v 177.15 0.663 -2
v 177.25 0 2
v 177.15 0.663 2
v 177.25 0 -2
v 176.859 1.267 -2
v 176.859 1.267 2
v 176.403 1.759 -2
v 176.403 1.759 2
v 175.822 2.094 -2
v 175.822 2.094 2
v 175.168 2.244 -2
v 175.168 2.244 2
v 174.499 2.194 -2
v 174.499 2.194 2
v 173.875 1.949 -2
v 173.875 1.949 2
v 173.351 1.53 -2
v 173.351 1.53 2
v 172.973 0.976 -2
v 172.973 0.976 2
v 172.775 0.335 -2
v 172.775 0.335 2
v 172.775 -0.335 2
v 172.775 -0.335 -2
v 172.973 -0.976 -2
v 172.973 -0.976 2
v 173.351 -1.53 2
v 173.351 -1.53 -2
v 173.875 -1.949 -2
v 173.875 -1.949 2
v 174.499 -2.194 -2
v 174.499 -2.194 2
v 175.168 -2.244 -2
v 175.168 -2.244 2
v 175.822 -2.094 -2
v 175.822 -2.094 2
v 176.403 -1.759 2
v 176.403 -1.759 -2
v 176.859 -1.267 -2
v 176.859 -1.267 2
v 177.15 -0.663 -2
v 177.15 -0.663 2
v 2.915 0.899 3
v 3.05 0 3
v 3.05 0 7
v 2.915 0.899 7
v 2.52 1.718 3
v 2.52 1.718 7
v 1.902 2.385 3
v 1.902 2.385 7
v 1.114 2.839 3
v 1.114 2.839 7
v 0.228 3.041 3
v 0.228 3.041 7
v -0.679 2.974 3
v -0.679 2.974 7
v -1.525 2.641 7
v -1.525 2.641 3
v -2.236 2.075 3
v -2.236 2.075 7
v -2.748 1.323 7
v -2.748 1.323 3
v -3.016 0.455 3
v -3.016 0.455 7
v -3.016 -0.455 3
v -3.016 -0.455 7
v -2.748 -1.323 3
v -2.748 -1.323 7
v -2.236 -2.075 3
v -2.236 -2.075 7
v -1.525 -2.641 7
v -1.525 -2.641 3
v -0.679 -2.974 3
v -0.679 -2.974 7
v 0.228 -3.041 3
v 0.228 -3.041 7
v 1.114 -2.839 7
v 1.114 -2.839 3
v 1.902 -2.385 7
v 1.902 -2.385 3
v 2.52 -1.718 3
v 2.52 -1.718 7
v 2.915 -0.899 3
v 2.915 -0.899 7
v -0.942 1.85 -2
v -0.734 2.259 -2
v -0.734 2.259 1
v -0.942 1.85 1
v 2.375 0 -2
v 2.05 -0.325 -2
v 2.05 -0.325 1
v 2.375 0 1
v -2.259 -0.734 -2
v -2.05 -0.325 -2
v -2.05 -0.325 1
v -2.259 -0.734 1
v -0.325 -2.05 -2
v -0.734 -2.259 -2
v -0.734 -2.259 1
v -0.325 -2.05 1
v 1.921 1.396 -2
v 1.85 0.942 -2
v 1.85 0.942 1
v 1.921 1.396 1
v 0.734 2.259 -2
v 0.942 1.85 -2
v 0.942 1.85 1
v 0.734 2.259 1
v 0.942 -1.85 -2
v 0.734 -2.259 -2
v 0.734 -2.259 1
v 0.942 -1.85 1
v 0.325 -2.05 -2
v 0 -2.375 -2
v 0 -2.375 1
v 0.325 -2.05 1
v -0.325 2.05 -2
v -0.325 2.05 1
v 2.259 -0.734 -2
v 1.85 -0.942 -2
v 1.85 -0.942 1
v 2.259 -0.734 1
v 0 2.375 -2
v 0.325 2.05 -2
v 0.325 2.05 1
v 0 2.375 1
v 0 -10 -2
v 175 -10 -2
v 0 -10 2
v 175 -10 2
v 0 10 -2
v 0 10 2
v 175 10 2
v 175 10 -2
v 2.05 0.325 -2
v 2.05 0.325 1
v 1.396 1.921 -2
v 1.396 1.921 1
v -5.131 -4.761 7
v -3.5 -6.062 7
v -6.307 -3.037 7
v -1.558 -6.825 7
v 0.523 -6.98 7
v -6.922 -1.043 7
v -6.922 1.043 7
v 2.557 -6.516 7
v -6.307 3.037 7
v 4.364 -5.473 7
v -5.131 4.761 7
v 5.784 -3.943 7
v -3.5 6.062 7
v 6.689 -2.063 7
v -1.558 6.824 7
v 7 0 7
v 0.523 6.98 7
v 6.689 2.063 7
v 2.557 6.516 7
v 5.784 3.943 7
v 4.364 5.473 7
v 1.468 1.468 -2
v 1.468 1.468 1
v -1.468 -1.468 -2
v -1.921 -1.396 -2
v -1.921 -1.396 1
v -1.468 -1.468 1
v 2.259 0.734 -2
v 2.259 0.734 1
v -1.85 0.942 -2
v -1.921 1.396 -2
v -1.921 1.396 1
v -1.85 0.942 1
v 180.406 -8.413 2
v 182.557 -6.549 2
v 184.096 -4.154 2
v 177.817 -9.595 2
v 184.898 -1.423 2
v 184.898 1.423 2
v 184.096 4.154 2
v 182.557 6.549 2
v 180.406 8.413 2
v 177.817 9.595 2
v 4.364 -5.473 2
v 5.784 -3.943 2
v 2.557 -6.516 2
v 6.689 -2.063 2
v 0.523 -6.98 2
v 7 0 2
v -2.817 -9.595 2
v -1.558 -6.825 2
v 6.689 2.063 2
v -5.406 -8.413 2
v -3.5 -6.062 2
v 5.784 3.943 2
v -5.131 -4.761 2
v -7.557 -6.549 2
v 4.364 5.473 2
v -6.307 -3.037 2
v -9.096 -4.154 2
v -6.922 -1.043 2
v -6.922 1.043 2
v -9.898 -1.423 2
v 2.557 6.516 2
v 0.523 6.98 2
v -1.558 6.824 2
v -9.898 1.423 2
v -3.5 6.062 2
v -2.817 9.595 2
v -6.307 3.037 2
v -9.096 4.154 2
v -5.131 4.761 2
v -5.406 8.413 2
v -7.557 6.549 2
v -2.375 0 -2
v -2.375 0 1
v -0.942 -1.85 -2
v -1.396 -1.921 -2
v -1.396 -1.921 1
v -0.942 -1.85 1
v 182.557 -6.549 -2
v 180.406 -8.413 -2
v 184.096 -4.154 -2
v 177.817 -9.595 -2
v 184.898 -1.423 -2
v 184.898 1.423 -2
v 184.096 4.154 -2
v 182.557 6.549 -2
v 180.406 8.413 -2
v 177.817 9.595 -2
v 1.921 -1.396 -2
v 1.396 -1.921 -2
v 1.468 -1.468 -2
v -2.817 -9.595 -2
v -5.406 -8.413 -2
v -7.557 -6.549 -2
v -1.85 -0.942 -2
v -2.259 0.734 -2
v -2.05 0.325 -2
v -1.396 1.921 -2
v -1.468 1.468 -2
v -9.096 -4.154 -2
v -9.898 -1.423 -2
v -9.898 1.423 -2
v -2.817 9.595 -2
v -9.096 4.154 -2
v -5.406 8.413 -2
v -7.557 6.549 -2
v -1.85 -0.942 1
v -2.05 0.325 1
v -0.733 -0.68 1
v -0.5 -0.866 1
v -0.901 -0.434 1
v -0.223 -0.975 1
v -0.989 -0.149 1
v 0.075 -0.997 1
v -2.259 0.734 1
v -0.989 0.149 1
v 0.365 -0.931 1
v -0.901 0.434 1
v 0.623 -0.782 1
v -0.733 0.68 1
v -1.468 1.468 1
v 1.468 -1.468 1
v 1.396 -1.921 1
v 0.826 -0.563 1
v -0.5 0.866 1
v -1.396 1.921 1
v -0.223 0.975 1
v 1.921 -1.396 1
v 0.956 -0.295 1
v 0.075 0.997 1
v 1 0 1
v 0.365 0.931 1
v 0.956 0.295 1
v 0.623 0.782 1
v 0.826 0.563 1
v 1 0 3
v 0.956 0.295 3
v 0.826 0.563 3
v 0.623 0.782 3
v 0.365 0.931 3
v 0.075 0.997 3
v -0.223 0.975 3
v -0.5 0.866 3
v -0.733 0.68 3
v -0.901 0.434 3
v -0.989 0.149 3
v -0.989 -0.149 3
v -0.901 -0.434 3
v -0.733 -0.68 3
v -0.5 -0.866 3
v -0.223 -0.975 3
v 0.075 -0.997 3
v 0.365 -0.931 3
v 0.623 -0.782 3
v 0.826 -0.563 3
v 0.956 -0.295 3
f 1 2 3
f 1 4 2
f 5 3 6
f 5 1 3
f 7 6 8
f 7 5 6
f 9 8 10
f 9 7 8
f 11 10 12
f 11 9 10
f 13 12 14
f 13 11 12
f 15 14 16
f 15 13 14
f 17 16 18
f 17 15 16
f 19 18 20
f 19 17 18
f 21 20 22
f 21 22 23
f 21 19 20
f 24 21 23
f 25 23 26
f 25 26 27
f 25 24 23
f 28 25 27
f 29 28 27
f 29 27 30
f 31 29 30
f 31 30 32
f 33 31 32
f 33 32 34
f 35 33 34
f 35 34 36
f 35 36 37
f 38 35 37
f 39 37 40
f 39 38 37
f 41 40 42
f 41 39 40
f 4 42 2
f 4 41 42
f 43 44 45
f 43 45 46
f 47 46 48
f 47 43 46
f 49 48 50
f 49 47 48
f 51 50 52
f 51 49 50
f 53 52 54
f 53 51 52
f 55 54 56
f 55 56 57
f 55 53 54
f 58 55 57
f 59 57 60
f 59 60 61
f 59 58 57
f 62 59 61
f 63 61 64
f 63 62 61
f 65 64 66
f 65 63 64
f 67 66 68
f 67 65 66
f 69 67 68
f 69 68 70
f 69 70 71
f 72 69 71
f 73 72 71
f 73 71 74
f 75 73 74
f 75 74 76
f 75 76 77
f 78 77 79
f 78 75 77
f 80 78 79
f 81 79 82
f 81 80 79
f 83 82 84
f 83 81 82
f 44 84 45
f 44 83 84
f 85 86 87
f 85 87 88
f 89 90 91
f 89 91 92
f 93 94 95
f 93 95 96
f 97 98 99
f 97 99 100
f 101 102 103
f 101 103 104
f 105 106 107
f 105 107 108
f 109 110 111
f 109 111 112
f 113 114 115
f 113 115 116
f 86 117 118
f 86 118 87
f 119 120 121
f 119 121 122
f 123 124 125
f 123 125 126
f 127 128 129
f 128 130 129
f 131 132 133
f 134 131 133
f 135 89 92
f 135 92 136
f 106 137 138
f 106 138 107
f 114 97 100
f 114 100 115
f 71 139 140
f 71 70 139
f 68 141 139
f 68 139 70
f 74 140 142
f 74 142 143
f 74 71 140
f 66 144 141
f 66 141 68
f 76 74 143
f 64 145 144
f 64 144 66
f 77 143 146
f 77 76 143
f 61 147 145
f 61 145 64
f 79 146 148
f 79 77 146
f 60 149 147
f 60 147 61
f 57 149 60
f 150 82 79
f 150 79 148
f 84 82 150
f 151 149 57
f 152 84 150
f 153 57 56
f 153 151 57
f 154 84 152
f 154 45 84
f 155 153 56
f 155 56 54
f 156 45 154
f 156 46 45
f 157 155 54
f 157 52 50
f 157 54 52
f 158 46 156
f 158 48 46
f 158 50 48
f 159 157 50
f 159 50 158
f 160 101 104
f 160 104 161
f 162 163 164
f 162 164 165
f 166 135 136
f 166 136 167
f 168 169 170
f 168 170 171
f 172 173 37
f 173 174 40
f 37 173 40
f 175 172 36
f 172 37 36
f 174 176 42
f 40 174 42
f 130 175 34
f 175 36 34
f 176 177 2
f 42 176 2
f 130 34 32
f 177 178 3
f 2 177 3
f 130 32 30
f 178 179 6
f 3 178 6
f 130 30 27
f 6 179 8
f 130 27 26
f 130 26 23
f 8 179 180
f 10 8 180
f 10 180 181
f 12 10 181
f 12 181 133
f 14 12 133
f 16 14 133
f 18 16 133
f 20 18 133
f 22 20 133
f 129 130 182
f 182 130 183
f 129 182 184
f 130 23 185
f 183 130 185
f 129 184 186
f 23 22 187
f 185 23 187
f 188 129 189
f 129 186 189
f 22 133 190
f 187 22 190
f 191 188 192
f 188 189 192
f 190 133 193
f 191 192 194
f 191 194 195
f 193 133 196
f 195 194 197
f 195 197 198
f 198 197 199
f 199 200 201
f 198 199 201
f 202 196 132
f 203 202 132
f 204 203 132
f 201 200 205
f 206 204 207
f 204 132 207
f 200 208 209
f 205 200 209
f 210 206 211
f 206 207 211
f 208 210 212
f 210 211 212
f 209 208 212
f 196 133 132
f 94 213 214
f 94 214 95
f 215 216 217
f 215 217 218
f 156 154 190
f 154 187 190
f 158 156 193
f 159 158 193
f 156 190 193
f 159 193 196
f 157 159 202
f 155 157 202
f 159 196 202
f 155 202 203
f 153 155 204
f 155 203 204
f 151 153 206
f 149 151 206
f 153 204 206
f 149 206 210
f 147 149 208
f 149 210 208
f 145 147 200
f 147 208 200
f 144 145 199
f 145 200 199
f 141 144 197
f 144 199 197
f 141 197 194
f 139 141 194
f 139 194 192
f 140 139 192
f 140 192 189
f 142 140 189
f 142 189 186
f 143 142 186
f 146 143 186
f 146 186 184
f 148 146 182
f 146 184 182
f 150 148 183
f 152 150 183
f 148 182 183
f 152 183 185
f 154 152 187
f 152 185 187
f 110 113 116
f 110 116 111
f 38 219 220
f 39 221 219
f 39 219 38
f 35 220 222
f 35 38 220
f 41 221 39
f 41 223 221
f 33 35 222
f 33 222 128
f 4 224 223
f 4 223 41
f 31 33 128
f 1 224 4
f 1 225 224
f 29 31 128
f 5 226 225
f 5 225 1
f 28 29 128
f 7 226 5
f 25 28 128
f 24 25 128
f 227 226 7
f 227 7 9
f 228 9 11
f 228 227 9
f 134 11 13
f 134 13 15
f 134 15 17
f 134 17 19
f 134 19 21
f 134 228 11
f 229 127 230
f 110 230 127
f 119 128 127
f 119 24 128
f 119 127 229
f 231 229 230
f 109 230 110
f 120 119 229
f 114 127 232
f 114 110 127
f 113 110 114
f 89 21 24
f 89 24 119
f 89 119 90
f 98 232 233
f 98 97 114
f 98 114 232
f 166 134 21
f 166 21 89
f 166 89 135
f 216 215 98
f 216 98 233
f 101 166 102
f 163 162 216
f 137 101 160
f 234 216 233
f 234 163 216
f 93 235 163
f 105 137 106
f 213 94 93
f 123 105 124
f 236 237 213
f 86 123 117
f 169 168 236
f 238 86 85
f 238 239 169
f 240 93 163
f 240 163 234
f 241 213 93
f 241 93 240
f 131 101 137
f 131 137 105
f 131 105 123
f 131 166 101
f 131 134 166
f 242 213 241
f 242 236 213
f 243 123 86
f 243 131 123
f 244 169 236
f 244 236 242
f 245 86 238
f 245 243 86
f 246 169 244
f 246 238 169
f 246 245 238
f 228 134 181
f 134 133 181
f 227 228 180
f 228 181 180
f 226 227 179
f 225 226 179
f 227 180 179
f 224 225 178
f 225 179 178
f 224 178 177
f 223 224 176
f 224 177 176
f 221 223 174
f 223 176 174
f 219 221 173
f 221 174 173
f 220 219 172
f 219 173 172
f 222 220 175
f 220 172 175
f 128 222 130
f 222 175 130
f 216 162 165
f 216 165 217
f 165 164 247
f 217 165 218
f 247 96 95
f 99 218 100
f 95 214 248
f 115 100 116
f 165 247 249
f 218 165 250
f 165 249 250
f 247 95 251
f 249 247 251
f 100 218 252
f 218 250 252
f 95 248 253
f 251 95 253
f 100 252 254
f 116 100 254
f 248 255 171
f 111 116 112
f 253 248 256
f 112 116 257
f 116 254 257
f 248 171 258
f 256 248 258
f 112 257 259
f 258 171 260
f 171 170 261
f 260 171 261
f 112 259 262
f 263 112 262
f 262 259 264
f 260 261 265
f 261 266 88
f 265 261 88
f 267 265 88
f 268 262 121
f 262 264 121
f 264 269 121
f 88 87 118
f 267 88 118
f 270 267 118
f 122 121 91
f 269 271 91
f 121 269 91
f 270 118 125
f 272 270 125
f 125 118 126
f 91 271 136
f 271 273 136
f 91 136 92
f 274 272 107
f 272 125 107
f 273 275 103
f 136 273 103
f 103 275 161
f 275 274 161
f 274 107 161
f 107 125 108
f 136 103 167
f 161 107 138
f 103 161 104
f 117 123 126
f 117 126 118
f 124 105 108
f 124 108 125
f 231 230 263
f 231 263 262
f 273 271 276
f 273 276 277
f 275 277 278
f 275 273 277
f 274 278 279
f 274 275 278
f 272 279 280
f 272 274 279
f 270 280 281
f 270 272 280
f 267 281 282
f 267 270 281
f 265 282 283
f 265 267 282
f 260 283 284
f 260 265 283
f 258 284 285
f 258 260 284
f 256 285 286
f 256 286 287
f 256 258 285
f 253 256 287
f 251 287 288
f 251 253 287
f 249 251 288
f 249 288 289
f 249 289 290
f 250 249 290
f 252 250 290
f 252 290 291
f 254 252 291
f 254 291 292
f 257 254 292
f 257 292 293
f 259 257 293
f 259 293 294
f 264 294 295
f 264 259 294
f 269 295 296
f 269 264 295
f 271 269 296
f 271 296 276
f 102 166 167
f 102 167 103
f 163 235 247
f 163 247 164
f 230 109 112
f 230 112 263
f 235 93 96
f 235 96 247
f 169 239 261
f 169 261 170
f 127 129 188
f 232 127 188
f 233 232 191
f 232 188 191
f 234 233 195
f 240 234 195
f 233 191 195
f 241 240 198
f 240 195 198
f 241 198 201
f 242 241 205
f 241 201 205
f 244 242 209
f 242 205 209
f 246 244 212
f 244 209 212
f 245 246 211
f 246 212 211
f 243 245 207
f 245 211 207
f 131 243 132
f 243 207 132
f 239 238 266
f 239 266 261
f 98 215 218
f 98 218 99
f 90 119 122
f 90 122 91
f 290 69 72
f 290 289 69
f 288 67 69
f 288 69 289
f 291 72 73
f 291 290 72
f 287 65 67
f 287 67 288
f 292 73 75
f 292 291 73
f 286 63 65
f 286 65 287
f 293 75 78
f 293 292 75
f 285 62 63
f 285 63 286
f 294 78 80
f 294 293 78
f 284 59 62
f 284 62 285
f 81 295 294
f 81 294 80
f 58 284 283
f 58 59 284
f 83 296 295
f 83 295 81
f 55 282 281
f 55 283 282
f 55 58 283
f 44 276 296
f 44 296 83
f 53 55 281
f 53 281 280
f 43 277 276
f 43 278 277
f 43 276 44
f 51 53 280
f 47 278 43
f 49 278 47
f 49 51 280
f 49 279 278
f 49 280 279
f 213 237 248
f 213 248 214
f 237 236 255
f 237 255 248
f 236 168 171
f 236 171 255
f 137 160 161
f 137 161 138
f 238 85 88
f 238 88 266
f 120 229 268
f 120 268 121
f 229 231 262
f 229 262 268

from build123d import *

# Parameters (mm, degrees)
SKETCH1_R           = 2.25
SKETCH1_R_2         = 1
BOSS_EXTRUDE1_DEPTH = 2
SKETCH4_R           = 7
SKETCH4_R_2         = 1
BOSS_EXTRUDE2_DEPTH = 1
SKETCH5_R           = 7
SKETCH5_R_2         = 3.05
BOSS_EXTRUDE3_DEPTH = 4
CUT_EXTRUDE1_DEPTH  = 3


with BuildPart() as part:
    # Sketch1 → Boss-Extrude1 (new, symmetric)
    with BuildSketch(Plane.XY):
        with BuildLine():
            Line((0, 10), (175, 10))
            ThreePointArc((175, 10), (185, 0), (175, -10))
            Line((175, -10), (0, -10))
            ThreePointArc((0, -10), (-10, 0), (0, 10))
        make_face()
        with Locations((175, 0)):
            Circle(SKETCH1_R, mode=Mode.SUBTRACT)
        with Locations((8.098e-06, -5.598e-06)):
            Circle(SKETCH1_R_2, mode=Mode.SUBTRACT)
    extrude(amount=BOSS_EXTRUDE1_DEPTH, both=True)

    # Sketch4 → Boss-Extrude2 (add)
    with BuildSketch(Plane.XY.offset(2)):
        with Locations((8.098e-06, -5.598e-06)):
            Circle(SKETCH4_R)
        with Locations((8.098e-06, -5.598e-06)):
            Circle(SKETCH4_R_2, mode=Mode.SUBTRACT)
    extrude(amount=BOSS_EXTRUDE2_DEPTH)

    # Sketch5 → Boss-Extrude3 (add)
    with BuildSketch(Plane.XY.offset(3)):
        with Locations((8.098e-06, -5.598e-06)):
            Circle(SKETCH5_R)
        with Locations((8.098e-06, -5.598e-06)):
            Circle(SKETCH5_R_2, mode=Mode.SUBTRACT)
    extrude(amount=BOSS_EXTRUDE3_DEPTH)

    # Sketch6 → Cut-Extrude1 (cut)
    with BuildSketch(Plane(origin=(0, 0, -2), x_dir=(-1, 0, 0), z_dir=(0, 0, -1))):
        Polygon((-0.324730573, 2.050263829), (0, 2.374994402), (0.324730573, 2.050261264), (0.733914965, 2.258751125), (0.942404034, 1.849564293), (1.395988428, 1.921405003), (1.46782763, 1.467818534), (1.921412023, 1.395977824), (1.849569238, 0.942391923), (2.25875363, 0.733902061), (2.050261329, 0.324716876), (2.374991902, -1.3697e-05), (2.050258764, -0.324744269), (2.258748625, -0.733928662), (1.849561793, -0.942417731), (1.921402503, -1.396002124), (1.467816034, -1.467841327), (1.395975324, -1.92142572), (0.942389423, -1.849582934), (0.733899561, -2.258767327), (0.324714376, -2.050275026), (-1.6197e-05, -2.375005598), (-0.324746769, -2.05027246), (-0.733931162, -2.258762322), (-0.942420231, -1.84957549), (-1.396004624, -1.9214162), (-1.467843827, -1.467829731), (-1.92142822, -1.395989021), (-1.849585434, -0.94240312), (-2.258769827, -0.733913258), (-2.050277526, -0.324728073), (-2.375008098, 2.5e-06), (-2.05027496, 0.324733073), (-2.258764822, 0.733917465), (-1.84957799, 0.942406534), (-1.9214187, 1.395990928), (-1.467832231, 1.46783013), (-1.395991521, 1.921414523), (-0.94240562, 1.849571738), (-0.733915758, 2.25875613), align=None)
    extrude(amount=-CUT_EXTRUDE1_DEPTH, mode=Mode.SUBTRACT)


solid = part.part
